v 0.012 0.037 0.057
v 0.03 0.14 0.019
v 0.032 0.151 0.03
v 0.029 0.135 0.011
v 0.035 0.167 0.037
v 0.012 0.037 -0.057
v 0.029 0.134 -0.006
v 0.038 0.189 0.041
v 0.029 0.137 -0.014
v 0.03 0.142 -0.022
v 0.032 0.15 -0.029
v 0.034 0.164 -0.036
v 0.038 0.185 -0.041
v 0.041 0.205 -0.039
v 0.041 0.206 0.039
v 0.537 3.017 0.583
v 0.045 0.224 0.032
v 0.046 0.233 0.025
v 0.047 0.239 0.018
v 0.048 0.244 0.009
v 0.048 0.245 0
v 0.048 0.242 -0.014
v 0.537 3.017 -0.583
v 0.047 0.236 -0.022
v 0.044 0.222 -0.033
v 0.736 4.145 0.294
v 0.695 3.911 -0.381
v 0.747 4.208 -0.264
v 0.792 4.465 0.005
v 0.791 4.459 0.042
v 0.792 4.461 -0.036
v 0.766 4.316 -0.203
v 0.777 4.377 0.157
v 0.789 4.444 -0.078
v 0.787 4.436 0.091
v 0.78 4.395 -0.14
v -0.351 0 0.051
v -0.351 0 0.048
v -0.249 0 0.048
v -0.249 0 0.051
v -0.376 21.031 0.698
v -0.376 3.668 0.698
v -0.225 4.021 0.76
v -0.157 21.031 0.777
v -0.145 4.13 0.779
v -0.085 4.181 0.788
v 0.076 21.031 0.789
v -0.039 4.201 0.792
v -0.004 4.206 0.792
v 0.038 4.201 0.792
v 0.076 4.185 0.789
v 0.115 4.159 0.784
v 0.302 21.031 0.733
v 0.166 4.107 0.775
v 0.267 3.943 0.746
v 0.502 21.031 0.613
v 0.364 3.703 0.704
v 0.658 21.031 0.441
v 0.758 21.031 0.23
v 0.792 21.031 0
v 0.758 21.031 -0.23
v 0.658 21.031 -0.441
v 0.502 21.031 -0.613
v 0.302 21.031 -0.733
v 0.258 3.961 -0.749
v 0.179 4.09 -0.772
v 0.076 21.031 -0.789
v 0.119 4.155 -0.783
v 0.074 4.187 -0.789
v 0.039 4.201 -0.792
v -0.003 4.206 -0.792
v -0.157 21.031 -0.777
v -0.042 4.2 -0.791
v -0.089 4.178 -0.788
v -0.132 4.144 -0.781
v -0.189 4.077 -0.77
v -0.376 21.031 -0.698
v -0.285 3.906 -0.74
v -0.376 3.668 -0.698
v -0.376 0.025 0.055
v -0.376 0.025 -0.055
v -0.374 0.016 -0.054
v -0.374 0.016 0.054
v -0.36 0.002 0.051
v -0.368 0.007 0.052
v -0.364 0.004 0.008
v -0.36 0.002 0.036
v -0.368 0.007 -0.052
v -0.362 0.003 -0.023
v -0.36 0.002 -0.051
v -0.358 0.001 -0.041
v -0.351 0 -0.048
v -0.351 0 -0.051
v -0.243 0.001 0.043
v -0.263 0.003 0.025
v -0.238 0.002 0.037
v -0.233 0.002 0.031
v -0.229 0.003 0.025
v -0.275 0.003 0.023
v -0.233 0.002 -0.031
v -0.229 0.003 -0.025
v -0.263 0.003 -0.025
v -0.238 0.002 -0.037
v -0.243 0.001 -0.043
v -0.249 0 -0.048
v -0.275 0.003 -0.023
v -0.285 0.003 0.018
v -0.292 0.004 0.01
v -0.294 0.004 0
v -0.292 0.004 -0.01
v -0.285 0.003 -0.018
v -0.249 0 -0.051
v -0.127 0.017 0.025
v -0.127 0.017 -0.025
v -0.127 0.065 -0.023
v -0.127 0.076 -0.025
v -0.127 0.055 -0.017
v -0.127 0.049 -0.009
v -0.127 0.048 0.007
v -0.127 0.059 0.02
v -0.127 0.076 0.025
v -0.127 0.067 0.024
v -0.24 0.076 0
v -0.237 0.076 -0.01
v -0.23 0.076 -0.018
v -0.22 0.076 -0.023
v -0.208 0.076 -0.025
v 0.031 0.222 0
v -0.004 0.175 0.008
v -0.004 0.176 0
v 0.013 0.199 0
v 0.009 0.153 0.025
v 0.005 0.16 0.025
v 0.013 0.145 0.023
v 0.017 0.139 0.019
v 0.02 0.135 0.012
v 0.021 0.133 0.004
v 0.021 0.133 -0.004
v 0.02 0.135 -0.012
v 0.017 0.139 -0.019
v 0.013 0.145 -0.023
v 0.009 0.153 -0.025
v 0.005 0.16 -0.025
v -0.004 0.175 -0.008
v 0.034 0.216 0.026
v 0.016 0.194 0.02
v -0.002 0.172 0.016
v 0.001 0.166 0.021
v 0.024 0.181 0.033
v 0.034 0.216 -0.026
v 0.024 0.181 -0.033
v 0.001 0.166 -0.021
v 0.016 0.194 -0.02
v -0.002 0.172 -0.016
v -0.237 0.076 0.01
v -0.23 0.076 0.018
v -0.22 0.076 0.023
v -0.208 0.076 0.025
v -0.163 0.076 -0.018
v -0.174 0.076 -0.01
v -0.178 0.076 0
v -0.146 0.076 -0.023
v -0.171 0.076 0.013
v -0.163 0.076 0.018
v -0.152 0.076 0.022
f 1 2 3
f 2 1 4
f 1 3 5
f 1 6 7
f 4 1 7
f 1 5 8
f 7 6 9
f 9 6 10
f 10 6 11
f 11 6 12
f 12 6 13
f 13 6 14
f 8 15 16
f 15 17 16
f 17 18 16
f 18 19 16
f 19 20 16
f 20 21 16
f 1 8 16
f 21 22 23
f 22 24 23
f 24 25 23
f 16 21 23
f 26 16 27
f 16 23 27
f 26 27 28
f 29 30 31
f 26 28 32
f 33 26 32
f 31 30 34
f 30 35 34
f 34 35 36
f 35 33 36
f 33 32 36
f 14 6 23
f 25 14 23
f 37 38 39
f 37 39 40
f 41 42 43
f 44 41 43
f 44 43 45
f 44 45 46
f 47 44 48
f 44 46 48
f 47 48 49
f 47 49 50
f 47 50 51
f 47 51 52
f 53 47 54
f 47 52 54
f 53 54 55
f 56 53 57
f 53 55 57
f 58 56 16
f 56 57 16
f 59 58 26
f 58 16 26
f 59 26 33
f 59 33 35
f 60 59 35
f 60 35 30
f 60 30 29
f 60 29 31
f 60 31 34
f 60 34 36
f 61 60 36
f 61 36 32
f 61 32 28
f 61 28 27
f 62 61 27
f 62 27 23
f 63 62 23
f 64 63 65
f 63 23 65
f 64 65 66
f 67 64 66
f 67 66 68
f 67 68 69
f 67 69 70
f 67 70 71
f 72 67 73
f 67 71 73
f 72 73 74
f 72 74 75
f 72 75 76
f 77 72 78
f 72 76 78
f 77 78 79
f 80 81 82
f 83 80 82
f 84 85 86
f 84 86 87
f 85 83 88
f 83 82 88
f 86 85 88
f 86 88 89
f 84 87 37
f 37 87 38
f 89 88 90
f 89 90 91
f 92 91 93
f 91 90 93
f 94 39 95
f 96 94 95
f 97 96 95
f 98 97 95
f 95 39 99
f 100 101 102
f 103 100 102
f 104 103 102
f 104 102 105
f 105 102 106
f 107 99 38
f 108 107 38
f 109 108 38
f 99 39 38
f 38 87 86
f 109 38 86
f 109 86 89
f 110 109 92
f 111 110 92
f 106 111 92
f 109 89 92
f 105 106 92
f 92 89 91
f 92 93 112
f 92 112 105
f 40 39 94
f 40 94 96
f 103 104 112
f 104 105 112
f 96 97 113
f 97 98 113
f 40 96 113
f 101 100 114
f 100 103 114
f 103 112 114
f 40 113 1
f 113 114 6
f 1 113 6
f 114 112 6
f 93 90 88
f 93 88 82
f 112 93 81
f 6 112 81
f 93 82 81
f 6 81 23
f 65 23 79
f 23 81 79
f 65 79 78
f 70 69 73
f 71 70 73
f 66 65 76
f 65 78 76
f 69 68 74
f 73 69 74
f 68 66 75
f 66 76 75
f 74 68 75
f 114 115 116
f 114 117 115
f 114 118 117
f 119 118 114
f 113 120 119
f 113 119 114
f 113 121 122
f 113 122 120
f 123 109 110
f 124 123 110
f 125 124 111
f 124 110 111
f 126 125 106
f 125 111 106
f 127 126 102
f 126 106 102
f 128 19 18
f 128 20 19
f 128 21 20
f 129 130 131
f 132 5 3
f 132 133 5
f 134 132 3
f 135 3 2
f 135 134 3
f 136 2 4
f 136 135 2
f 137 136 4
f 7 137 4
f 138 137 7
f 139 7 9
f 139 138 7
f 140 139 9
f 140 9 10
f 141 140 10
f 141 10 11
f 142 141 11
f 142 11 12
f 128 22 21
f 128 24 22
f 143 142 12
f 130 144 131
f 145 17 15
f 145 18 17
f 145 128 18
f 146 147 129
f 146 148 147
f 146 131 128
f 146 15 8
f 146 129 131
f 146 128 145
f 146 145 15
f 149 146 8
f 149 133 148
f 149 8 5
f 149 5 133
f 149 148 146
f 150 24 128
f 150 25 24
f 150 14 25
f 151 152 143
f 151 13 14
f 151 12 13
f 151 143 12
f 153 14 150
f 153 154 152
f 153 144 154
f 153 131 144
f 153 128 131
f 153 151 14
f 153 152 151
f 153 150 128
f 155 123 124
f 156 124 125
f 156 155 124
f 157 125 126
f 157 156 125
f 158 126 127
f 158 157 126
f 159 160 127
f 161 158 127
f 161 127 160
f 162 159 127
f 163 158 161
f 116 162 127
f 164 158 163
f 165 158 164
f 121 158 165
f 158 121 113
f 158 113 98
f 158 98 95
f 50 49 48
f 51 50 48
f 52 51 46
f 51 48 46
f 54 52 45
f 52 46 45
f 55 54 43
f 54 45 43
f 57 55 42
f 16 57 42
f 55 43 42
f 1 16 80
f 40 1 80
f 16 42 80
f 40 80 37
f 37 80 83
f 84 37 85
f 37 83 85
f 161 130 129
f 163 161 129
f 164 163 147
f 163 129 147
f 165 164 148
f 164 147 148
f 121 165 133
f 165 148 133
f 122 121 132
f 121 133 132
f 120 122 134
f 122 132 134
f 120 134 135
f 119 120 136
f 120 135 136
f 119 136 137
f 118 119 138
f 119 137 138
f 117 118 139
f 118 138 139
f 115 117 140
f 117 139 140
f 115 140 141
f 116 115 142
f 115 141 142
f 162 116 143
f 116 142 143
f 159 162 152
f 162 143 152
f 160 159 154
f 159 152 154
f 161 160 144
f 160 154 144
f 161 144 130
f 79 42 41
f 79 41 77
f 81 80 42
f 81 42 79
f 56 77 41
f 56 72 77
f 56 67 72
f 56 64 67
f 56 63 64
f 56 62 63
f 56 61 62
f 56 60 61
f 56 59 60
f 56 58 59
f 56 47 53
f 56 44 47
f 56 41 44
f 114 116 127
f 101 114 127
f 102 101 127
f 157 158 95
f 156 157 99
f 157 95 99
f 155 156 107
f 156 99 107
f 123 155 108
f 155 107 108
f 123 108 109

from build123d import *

# Parameters (mm, degrees)
TD_SKETCH_R                             = 0.79248
TL_FEATURE_DEPTH                        = 21.0312
TDF_STD_SKETCH_W                        = 2.09296
TDF_STD_SKETCH_H                        = 2.09296
TDF_STD_FEATURE_DEPTH                   = 22.061040395
ISA_20_STD_FEATURE_DEPTH                = 22.061040395
ISA_20_STD_FEATURE_DEPTH_BACK           = 22.061040395
F_10BA_STD_FEATURE_DEPTH                = 22.061040395
F_10BA_STD_FEATURE_DEPTH_BACK           = 22.061040395
FRO_STD_FEATURE_DEPTH                   = 22.061040395
FRO_STD_FEATURE_DEPTH_BACK              = 22.061040395
C_STD_FEATURE_DEPTH                     = 22.061040395
C_STD_FEATURE_DEPTH_BACK                = 22.061040395
ERW_STD_FEATURE_DEPTH                   = 0.0254
H_STD_FEATURE_REACH                     = 22.907
H_STD_SKETCH_R                          = 0.0254
H_STD_SKETCH_3_R                        = 0.0254
FUNNEL_FINAL_DIAMETRE_STD_FEATURE_DEPTH = 2.499995
FUNNEL_FINAL_DIAMETRE_STD_FEATURE_DRAFT = -22.5
ROUND_BR_STD_FEATURE_START              = -1
ROUND_BR_STD_FEATURE_DEPTH              = 0.984425518


with BuildPart() as part:
    # TD_sketch → TL_feature (new body)
    with BuildSketch(Plane(origin=(0, 0, 0), x_dir=(1, 0, 0), z_dir=(0, 1, 0))):
        with Locations(Location((0, 0, 0), (0, 0, 270))):
            Circle(TD_SKETCH_R)
    extrude(amount=TL_FEATURE_DEPTH)

    # TDF_STD_sketch → TDF_STD_feature (cut, through all)
    with BuildSketch(Plane(origin=(0, 0, 0), x_dir=(1, 0, 0), z_dir=(0, 1, 0))):
        with Locations((-1.4224, 0)):
            Rectangle(TDF_STD_SKETCH_W, TDF_STD_SKETCH_H)
    extrude(amount=TDF_STD_FEATURE_DEPTH, mode=Mode.SUBTRACT)

    # ISA_20_STD_sketch → ISA_20_STD_feature (cut, two sides: drawn at the far end of the back side and taken through both)
    with BuildSketch(Plane(origin=(0, 0, 0), x_dir=(0, 0, -1), z_dir=(1, 0, 0)).offset(-ISA_20_STD_FEATURE_DEPTH_BACK)):
        Polygon((-12.968809457, 73.261672178), (-3.759167997, 21.0312), (-0.0508, 0), (0.0508, 0), (3.759167997, 21.0312), (12.968809457, 73.261672178), (12.968809457, -32.810750623), (-12.968809457, -32.810750623), align=None)
    extrude(amount=ISA_20_STD_FEATURE_DEPTH + ISA_20_STD_FEATURE_DEPTH_BACK, mode=Mode.SUBTRACT)

    # 10BA_STD_sketch → 10BA_STD_feature (cut, two sides: drawn at the far end of the back side and taken through both)
    with BuildSketch(Plane.XY.offset(-F_10BA_STD_FEATURE_DEPTH_BACK)):
        Polygon((-53.226091717, 0), (-0.37592, 0), (-0.24892, 0), (0.011534356, 0.036604473), (3.713447997, 21.0312), (12.890784005, 73.078458855), (91.272293615, 2.163710365), (25.155417893, -70.914748491), align=None)
    extrude(amount=F_10BA_STD_FEATURE_DEPTH + F_10BA_STD_FEATURE_DEPTH_BACK, mode=Mode.SUBTRACT)

    # FRO_STD_sketch → FRO_STD_feature (cut, two sides: drawn at the far end of the back side and taken through both)
    with BuildSketch(Plane.XY.offset(-FRO_STD_FEATURE_DEPTH_BACK)):
        with BuildLine():
            Line((-0.37592, 52.149873762), (-0.37592, 0.0254))
            ThreePointArc((-0.37592, 0.0254), (-0.368480512, 0.007439488), (-0.35052, 0))
            Line((-0.35052, 0), (51.773953762, 0))
            Line((51.773953762, 0), (-21.941183964, -73.715137726))
            Line((-21.941183964, -73.715137726), (-74.091057726, -21.565263964))
            Line((-74.091057726, -21.565263964), (-0.37592, 52.149873762))
        make_face()
    extrude(amount=FRO_STD_FEATURE_DEPTH + FRO_STD_FEATURE_DEPTH_BACK, mode=Mode.SUBTRACT)

    # C_STD_sketch → C_STD_feature (cut, two sides: drawn at the far end of the back side and taken through both)
    with BuildSketch(Plane(origin=(0, 0, 0), x_dir=(0, 0, -1), z_dir=(1, 0, 0)).offset(-C_STD_FEATURE_DEPTH_BACK)):
        with BuildLine():
            Line((-51.498419713, -8.177529753), (-0.048243287, 0))
            ThreePointArc((-0.048243287, 0), (0, 0.00381), (0.048243287, 0))
            Line((0.048243287, 0), (51.498419713, -8.177529753))
            Line((51.498419713, -8.177529753), (51.498419713, -112.369518834))
            Line((51.498419713, -112.369518834), (-51.498419713, -112.369518834))
            Line((-51.498419713, -112.369518834), (-51.498419713, -8.177529753))
        make_face()
    extrude(amount=C_STD_FEATURE_DEPTH + C_STD_FEATURE_DEPTH_BACK, mode=Mode.SUBTRACT)


with BuildPart() as body_2:
    # ERW_STD_sketch → ERW_STD_feature (new, symmetric)
    with BuildSketch(Plane.XY):
        Polygon((-0.127, 0.0762), (-0.127, 0), (-0.29718, 0), (-0.239759181, 0.0762), align=None)
    extrude(amount=ERW_STD_FEATURE_DEPTH, both=True)

    # H_STD_sketch → H_STD_feature (add, up to next)
    with BuildSketch(Plane(origin=(0.008335492, 0.154335983, 0), x_dir=(0, 0, -1), z_dir=(0.8660254037844415, 0.4999999999999953, 0)), mode=Mode.PRIVATE) as h_std_feature_sk1:
        with Locations(Location((0, 0, 0), (0, 0, 90))):
            Circle(H_STD_SKETCH_R)
    h_std_feature_tool1 = extrude(h_std_feature_sk1.sketch, amount=-H_STD_FEATURE_REACH, mode=Mode.PRIVATE) - body_2.part
    add(h_std_feature_tool1.solids().sort_by_distance((0.008335, 0.154336, 0))[0])


with BuildPart() as funnel_final_diametre_std_feature_tool:
    # H_STD_sketch<3> → funnel_final_diametre_STD_feature (with draft: the straight prism first)
    with BuildSketch(Plane(origin=(0.008335492, 0.154335983, 0), x_dir=(0, 0, -1), z_dir=(0.8660254037844415, 0.4999999999999953, 0))):
        with Locations(Location((0, 0, 0), (0, 0, 90))):
            Circle(H_STD_SKETCH_3_R)
    extrude(amount=FUNNEL_FINAL_DIAMETRE_STD_FEATURE_DEPTH)
    # funnel_final_diametre_STD_feature: the draft: its side faces are tilted about the plane it starts from
    funnel_final_diametre_std_feature_sides = [funnel_final_diametre_std_feature_tool.faces().sort_by_distance(p)[0] for p in [
        (1.103565082, 0.757337687, 0),
    ]]
    draft(funnel_final_diametre_std_feature_sides, Plane(origin=(0.008335492, 0.154335983, 0), x_dir=(0, 0, -1), z_dir=(0.8660254037844415, 0.4999999999999953, 0)), FUNNEL_FINAL_DIAMETRE_STD_FEATURE_DRAFT)


with BuildPart() as body_2_1:
    add(body_2.part)

    # funnel_final_diametre_STD_feature: add funnel_final_diametre_std_feature_tool
    add(funnel_final_diametre_std_feature_tool.part)

    # ROUND_BR_STD_feature: read off the stored shape, not the designer's step
    # ROUND_BR_STD_feature outline → ROUND_BR_STD_feature (cut)
    with BuildSketch(Plane(origin=(0, 0, 0), x_dir=(0.79863551004729, -0.601815023152052, 0), z_dir=(0.601815023152052, 0.79863551004729, 0)).offset(ROUND_BR_STD_FEATURE_START)):
        with BuildLine():
            Line((-0.237338501, -0.0254), (-0.211938501, -0.0254))
            ThreePointArc((-0.211938501, -0.0254), (-0.229899013, -0.017960512), (-0.237338501, 0))
            Line((-0.237338501, 0), (-0.237338501, -0.0254))
        make_face()
        with BuildLine():
            Line((-0.237338501, 0.0254), (-0.237338501, 0))
            ThreePointArc((-0.237338501, 0), (-0.229899013, 0.017960512), (-0.211938501, 0.0254))
            Line((-0.211938501, 0.0254), (-0.237338501, 0.0254))
        make_face()
    extrude(amount=ROUND_BR_STD_FEATURE_DEPTH, mode=Mode.SUBTRACT)


with BuildPart() as part_1:
    add(part.part)

    # COMBINE_STD_feature: cut body 2
    add(body_2_1.part, mode=Mode.SUBTRACT)


solid = part_1.part
